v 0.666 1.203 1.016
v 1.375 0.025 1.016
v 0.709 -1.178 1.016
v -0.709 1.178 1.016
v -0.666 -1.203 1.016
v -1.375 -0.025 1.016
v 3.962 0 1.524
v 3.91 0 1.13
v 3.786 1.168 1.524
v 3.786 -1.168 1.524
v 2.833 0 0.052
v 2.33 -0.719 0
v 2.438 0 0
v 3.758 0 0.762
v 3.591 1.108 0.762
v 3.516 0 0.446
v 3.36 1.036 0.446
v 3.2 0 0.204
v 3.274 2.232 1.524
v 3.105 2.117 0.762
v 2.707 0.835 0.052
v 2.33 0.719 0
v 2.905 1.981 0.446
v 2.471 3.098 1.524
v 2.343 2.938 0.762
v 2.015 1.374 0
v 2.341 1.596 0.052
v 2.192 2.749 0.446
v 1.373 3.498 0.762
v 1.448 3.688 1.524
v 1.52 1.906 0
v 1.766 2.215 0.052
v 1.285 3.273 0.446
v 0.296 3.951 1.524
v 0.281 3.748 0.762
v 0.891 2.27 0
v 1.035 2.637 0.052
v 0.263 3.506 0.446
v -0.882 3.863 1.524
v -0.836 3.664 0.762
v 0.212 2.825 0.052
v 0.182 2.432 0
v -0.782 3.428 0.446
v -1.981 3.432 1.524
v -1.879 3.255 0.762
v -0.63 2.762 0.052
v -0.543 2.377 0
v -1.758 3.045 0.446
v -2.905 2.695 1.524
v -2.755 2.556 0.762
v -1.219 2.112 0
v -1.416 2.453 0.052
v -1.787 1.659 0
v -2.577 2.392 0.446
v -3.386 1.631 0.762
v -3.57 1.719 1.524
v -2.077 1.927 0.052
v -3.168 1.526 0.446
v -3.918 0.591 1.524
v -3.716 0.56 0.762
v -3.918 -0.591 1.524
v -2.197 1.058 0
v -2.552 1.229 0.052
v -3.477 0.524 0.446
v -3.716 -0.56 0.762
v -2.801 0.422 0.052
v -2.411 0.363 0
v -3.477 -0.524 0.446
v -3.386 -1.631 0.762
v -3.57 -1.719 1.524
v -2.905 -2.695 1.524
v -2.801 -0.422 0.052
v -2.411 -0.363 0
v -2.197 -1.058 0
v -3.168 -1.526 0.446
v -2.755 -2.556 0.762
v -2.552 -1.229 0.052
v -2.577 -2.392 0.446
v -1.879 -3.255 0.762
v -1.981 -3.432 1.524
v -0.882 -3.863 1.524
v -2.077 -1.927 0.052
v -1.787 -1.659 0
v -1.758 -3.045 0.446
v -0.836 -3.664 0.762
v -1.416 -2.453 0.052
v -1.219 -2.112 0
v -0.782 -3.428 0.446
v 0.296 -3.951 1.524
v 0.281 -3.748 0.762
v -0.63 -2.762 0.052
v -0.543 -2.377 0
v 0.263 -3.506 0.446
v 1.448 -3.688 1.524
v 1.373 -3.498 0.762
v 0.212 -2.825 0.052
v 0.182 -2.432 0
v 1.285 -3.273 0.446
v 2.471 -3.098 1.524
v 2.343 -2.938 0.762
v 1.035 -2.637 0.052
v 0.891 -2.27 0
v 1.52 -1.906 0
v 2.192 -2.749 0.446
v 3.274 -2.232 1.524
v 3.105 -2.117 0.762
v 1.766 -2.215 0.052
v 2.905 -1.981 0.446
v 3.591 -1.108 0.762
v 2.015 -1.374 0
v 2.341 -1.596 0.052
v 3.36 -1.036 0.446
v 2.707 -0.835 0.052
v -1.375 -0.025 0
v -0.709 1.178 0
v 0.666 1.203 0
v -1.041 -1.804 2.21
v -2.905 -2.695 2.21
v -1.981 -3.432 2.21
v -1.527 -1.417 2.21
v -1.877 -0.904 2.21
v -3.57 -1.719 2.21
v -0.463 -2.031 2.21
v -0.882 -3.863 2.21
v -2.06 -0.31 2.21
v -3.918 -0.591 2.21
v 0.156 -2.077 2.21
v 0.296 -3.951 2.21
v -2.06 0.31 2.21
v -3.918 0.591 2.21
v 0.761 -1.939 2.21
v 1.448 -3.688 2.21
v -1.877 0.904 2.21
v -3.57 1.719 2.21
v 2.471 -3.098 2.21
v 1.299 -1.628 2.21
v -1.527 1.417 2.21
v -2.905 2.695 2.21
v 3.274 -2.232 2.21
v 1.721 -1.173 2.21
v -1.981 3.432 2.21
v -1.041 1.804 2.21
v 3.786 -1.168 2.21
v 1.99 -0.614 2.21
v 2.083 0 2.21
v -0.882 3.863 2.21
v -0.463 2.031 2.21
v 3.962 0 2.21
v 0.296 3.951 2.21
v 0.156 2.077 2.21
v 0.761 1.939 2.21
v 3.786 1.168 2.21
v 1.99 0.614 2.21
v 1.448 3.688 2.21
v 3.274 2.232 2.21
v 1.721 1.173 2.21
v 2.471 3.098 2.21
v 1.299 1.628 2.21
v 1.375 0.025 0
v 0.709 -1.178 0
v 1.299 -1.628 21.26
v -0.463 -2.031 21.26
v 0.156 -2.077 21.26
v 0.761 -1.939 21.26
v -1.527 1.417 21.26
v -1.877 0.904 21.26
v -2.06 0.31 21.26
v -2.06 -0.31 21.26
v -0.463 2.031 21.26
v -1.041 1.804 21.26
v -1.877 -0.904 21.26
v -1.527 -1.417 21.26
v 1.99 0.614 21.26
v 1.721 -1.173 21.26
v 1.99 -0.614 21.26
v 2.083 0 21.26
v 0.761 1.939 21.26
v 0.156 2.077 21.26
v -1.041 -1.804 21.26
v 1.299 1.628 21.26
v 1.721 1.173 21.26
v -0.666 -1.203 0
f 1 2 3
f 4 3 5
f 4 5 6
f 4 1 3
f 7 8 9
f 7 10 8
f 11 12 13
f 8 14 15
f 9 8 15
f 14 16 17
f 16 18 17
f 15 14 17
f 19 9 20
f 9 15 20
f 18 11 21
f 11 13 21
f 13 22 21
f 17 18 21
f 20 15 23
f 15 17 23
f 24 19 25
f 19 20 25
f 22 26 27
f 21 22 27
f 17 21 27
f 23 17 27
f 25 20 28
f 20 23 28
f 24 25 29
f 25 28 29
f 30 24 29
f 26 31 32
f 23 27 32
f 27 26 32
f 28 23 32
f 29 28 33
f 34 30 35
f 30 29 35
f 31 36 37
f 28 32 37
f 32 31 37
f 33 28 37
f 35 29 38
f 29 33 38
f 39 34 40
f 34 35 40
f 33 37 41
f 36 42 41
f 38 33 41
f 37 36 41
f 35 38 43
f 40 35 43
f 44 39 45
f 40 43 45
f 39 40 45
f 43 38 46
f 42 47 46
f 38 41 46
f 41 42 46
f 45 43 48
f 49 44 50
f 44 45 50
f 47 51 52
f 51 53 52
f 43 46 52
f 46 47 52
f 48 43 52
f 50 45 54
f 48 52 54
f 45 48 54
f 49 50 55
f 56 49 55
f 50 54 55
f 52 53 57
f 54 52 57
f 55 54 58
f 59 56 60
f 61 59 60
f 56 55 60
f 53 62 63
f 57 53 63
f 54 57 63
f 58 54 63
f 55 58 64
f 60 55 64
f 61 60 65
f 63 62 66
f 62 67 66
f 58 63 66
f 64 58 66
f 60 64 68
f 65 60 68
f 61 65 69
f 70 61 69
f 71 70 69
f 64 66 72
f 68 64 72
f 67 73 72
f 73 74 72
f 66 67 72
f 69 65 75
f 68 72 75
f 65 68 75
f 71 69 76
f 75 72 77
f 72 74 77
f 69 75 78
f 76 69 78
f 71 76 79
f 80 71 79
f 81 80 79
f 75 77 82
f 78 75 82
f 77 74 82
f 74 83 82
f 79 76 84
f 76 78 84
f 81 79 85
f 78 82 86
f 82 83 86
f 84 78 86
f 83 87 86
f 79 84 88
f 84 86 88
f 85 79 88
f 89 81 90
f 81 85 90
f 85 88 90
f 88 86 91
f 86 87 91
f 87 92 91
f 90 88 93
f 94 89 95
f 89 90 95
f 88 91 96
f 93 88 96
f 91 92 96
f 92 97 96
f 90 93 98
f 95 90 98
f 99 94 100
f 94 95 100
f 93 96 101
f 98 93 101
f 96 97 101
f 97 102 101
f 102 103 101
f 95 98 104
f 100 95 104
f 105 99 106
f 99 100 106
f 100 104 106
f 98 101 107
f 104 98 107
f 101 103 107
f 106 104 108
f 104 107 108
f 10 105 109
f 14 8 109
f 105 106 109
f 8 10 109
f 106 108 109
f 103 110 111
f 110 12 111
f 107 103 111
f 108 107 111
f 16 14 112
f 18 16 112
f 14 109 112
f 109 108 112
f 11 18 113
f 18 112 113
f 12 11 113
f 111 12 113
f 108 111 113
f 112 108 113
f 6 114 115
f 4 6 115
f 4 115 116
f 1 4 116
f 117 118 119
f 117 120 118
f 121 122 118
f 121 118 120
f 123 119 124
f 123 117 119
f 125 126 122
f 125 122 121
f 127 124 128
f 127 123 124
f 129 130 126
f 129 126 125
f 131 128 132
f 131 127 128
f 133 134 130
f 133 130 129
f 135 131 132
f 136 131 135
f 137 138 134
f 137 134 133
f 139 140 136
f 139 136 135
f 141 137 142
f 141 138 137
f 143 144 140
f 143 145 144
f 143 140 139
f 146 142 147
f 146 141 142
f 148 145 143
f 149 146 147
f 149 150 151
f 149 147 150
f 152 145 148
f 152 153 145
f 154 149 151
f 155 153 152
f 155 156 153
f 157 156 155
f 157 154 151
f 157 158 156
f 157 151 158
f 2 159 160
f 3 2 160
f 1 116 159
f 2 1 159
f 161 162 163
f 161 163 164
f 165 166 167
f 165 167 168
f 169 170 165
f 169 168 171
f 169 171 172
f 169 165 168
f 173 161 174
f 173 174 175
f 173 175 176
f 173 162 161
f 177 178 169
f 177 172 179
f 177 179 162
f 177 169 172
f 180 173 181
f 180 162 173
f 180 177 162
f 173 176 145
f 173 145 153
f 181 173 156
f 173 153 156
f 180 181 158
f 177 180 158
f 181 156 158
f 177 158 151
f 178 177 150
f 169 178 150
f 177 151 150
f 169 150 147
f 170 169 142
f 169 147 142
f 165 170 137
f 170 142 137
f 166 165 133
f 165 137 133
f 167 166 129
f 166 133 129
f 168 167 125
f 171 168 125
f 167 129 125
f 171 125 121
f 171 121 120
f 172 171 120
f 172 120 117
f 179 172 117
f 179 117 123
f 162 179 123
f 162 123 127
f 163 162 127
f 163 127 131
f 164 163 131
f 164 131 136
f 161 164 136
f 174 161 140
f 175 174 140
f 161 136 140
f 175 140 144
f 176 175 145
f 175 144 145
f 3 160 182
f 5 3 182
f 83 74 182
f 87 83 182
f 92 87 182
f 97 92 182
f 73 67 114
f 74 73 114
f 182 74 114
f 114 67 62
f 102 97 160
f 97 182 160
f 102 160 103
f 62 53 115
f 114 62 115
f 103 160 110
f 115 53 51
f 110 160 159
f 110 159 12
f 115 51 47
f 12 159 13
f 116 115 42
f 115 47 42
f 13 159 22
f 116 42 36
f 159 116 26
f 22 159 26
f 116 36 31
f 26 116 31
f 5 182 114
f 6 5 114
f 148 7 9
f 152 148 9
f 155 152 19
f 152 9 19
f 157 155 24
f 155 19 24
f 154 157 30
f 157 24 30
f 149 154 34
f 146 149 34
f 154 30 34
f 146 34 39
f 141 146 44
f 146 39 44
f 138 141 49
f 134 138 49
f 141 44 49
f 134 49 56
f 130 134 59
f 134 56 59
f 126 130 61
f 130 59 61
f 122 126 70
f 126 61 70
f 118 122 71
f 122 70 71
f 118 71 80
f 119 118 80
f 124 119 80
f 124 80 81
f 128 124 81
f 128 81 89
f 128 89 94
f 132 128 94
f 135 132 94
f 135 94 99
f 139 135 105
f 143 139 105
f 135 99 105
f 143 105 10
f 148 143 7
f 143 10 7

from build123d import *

# Parameters (mm, degrees)
SKETCH1_R      = 3.9624
EXTRUDE1_DEPTH = 2.2098
FILLET1_R      = 1.524
SKETCH2_R      = 2.0828
EXTRUDE2_DEPTH = 19.05
EXTRUDE3_DEPTH = 1.016


with BuildPart() as part:
    # Sketch1 → Extrude1 (new body)
    with BuildSketch(Plane.XY):
        Circle(SKETCH1_R)
    extrude(amount=EXTRUDE1_DEPTH)

    # Fillet1
    fillet1_edges = [part.edges().sort_by_distance(p)[0] for p in [
        (-3.9624, 0, 0),
    ]]
    fillet(fillet1_edges, radius=FILLET1_R)

    # Sketch2 → Extrude2 (add)
    with BuildSketch(Plane.XY.offset(2.2098)):
        Circle(SKETCH2_R)
    extrude(amount=EXTRUDE2_DEPTH)

    # Sketch3 → Extrude3 (cut)
    with BuildSketch(Plane(origin=(0, 0, 0), x_dir=(-1, 0, 0), z_dir=(0, 0, -1))):
        Polygon((0.709024608, 1.177879999), (-0.665561698, 1.202973322), (-1.374586306, 0.025093323), (-0.709024608, -1.177879999), (0.665561698, -1.202973322), (1.374586306, -0.025093323), align=None)
    extrude(amount=-EXTRUDE3_DEPTH, mode=Mode.SUBTRACT)


solid = part.part
